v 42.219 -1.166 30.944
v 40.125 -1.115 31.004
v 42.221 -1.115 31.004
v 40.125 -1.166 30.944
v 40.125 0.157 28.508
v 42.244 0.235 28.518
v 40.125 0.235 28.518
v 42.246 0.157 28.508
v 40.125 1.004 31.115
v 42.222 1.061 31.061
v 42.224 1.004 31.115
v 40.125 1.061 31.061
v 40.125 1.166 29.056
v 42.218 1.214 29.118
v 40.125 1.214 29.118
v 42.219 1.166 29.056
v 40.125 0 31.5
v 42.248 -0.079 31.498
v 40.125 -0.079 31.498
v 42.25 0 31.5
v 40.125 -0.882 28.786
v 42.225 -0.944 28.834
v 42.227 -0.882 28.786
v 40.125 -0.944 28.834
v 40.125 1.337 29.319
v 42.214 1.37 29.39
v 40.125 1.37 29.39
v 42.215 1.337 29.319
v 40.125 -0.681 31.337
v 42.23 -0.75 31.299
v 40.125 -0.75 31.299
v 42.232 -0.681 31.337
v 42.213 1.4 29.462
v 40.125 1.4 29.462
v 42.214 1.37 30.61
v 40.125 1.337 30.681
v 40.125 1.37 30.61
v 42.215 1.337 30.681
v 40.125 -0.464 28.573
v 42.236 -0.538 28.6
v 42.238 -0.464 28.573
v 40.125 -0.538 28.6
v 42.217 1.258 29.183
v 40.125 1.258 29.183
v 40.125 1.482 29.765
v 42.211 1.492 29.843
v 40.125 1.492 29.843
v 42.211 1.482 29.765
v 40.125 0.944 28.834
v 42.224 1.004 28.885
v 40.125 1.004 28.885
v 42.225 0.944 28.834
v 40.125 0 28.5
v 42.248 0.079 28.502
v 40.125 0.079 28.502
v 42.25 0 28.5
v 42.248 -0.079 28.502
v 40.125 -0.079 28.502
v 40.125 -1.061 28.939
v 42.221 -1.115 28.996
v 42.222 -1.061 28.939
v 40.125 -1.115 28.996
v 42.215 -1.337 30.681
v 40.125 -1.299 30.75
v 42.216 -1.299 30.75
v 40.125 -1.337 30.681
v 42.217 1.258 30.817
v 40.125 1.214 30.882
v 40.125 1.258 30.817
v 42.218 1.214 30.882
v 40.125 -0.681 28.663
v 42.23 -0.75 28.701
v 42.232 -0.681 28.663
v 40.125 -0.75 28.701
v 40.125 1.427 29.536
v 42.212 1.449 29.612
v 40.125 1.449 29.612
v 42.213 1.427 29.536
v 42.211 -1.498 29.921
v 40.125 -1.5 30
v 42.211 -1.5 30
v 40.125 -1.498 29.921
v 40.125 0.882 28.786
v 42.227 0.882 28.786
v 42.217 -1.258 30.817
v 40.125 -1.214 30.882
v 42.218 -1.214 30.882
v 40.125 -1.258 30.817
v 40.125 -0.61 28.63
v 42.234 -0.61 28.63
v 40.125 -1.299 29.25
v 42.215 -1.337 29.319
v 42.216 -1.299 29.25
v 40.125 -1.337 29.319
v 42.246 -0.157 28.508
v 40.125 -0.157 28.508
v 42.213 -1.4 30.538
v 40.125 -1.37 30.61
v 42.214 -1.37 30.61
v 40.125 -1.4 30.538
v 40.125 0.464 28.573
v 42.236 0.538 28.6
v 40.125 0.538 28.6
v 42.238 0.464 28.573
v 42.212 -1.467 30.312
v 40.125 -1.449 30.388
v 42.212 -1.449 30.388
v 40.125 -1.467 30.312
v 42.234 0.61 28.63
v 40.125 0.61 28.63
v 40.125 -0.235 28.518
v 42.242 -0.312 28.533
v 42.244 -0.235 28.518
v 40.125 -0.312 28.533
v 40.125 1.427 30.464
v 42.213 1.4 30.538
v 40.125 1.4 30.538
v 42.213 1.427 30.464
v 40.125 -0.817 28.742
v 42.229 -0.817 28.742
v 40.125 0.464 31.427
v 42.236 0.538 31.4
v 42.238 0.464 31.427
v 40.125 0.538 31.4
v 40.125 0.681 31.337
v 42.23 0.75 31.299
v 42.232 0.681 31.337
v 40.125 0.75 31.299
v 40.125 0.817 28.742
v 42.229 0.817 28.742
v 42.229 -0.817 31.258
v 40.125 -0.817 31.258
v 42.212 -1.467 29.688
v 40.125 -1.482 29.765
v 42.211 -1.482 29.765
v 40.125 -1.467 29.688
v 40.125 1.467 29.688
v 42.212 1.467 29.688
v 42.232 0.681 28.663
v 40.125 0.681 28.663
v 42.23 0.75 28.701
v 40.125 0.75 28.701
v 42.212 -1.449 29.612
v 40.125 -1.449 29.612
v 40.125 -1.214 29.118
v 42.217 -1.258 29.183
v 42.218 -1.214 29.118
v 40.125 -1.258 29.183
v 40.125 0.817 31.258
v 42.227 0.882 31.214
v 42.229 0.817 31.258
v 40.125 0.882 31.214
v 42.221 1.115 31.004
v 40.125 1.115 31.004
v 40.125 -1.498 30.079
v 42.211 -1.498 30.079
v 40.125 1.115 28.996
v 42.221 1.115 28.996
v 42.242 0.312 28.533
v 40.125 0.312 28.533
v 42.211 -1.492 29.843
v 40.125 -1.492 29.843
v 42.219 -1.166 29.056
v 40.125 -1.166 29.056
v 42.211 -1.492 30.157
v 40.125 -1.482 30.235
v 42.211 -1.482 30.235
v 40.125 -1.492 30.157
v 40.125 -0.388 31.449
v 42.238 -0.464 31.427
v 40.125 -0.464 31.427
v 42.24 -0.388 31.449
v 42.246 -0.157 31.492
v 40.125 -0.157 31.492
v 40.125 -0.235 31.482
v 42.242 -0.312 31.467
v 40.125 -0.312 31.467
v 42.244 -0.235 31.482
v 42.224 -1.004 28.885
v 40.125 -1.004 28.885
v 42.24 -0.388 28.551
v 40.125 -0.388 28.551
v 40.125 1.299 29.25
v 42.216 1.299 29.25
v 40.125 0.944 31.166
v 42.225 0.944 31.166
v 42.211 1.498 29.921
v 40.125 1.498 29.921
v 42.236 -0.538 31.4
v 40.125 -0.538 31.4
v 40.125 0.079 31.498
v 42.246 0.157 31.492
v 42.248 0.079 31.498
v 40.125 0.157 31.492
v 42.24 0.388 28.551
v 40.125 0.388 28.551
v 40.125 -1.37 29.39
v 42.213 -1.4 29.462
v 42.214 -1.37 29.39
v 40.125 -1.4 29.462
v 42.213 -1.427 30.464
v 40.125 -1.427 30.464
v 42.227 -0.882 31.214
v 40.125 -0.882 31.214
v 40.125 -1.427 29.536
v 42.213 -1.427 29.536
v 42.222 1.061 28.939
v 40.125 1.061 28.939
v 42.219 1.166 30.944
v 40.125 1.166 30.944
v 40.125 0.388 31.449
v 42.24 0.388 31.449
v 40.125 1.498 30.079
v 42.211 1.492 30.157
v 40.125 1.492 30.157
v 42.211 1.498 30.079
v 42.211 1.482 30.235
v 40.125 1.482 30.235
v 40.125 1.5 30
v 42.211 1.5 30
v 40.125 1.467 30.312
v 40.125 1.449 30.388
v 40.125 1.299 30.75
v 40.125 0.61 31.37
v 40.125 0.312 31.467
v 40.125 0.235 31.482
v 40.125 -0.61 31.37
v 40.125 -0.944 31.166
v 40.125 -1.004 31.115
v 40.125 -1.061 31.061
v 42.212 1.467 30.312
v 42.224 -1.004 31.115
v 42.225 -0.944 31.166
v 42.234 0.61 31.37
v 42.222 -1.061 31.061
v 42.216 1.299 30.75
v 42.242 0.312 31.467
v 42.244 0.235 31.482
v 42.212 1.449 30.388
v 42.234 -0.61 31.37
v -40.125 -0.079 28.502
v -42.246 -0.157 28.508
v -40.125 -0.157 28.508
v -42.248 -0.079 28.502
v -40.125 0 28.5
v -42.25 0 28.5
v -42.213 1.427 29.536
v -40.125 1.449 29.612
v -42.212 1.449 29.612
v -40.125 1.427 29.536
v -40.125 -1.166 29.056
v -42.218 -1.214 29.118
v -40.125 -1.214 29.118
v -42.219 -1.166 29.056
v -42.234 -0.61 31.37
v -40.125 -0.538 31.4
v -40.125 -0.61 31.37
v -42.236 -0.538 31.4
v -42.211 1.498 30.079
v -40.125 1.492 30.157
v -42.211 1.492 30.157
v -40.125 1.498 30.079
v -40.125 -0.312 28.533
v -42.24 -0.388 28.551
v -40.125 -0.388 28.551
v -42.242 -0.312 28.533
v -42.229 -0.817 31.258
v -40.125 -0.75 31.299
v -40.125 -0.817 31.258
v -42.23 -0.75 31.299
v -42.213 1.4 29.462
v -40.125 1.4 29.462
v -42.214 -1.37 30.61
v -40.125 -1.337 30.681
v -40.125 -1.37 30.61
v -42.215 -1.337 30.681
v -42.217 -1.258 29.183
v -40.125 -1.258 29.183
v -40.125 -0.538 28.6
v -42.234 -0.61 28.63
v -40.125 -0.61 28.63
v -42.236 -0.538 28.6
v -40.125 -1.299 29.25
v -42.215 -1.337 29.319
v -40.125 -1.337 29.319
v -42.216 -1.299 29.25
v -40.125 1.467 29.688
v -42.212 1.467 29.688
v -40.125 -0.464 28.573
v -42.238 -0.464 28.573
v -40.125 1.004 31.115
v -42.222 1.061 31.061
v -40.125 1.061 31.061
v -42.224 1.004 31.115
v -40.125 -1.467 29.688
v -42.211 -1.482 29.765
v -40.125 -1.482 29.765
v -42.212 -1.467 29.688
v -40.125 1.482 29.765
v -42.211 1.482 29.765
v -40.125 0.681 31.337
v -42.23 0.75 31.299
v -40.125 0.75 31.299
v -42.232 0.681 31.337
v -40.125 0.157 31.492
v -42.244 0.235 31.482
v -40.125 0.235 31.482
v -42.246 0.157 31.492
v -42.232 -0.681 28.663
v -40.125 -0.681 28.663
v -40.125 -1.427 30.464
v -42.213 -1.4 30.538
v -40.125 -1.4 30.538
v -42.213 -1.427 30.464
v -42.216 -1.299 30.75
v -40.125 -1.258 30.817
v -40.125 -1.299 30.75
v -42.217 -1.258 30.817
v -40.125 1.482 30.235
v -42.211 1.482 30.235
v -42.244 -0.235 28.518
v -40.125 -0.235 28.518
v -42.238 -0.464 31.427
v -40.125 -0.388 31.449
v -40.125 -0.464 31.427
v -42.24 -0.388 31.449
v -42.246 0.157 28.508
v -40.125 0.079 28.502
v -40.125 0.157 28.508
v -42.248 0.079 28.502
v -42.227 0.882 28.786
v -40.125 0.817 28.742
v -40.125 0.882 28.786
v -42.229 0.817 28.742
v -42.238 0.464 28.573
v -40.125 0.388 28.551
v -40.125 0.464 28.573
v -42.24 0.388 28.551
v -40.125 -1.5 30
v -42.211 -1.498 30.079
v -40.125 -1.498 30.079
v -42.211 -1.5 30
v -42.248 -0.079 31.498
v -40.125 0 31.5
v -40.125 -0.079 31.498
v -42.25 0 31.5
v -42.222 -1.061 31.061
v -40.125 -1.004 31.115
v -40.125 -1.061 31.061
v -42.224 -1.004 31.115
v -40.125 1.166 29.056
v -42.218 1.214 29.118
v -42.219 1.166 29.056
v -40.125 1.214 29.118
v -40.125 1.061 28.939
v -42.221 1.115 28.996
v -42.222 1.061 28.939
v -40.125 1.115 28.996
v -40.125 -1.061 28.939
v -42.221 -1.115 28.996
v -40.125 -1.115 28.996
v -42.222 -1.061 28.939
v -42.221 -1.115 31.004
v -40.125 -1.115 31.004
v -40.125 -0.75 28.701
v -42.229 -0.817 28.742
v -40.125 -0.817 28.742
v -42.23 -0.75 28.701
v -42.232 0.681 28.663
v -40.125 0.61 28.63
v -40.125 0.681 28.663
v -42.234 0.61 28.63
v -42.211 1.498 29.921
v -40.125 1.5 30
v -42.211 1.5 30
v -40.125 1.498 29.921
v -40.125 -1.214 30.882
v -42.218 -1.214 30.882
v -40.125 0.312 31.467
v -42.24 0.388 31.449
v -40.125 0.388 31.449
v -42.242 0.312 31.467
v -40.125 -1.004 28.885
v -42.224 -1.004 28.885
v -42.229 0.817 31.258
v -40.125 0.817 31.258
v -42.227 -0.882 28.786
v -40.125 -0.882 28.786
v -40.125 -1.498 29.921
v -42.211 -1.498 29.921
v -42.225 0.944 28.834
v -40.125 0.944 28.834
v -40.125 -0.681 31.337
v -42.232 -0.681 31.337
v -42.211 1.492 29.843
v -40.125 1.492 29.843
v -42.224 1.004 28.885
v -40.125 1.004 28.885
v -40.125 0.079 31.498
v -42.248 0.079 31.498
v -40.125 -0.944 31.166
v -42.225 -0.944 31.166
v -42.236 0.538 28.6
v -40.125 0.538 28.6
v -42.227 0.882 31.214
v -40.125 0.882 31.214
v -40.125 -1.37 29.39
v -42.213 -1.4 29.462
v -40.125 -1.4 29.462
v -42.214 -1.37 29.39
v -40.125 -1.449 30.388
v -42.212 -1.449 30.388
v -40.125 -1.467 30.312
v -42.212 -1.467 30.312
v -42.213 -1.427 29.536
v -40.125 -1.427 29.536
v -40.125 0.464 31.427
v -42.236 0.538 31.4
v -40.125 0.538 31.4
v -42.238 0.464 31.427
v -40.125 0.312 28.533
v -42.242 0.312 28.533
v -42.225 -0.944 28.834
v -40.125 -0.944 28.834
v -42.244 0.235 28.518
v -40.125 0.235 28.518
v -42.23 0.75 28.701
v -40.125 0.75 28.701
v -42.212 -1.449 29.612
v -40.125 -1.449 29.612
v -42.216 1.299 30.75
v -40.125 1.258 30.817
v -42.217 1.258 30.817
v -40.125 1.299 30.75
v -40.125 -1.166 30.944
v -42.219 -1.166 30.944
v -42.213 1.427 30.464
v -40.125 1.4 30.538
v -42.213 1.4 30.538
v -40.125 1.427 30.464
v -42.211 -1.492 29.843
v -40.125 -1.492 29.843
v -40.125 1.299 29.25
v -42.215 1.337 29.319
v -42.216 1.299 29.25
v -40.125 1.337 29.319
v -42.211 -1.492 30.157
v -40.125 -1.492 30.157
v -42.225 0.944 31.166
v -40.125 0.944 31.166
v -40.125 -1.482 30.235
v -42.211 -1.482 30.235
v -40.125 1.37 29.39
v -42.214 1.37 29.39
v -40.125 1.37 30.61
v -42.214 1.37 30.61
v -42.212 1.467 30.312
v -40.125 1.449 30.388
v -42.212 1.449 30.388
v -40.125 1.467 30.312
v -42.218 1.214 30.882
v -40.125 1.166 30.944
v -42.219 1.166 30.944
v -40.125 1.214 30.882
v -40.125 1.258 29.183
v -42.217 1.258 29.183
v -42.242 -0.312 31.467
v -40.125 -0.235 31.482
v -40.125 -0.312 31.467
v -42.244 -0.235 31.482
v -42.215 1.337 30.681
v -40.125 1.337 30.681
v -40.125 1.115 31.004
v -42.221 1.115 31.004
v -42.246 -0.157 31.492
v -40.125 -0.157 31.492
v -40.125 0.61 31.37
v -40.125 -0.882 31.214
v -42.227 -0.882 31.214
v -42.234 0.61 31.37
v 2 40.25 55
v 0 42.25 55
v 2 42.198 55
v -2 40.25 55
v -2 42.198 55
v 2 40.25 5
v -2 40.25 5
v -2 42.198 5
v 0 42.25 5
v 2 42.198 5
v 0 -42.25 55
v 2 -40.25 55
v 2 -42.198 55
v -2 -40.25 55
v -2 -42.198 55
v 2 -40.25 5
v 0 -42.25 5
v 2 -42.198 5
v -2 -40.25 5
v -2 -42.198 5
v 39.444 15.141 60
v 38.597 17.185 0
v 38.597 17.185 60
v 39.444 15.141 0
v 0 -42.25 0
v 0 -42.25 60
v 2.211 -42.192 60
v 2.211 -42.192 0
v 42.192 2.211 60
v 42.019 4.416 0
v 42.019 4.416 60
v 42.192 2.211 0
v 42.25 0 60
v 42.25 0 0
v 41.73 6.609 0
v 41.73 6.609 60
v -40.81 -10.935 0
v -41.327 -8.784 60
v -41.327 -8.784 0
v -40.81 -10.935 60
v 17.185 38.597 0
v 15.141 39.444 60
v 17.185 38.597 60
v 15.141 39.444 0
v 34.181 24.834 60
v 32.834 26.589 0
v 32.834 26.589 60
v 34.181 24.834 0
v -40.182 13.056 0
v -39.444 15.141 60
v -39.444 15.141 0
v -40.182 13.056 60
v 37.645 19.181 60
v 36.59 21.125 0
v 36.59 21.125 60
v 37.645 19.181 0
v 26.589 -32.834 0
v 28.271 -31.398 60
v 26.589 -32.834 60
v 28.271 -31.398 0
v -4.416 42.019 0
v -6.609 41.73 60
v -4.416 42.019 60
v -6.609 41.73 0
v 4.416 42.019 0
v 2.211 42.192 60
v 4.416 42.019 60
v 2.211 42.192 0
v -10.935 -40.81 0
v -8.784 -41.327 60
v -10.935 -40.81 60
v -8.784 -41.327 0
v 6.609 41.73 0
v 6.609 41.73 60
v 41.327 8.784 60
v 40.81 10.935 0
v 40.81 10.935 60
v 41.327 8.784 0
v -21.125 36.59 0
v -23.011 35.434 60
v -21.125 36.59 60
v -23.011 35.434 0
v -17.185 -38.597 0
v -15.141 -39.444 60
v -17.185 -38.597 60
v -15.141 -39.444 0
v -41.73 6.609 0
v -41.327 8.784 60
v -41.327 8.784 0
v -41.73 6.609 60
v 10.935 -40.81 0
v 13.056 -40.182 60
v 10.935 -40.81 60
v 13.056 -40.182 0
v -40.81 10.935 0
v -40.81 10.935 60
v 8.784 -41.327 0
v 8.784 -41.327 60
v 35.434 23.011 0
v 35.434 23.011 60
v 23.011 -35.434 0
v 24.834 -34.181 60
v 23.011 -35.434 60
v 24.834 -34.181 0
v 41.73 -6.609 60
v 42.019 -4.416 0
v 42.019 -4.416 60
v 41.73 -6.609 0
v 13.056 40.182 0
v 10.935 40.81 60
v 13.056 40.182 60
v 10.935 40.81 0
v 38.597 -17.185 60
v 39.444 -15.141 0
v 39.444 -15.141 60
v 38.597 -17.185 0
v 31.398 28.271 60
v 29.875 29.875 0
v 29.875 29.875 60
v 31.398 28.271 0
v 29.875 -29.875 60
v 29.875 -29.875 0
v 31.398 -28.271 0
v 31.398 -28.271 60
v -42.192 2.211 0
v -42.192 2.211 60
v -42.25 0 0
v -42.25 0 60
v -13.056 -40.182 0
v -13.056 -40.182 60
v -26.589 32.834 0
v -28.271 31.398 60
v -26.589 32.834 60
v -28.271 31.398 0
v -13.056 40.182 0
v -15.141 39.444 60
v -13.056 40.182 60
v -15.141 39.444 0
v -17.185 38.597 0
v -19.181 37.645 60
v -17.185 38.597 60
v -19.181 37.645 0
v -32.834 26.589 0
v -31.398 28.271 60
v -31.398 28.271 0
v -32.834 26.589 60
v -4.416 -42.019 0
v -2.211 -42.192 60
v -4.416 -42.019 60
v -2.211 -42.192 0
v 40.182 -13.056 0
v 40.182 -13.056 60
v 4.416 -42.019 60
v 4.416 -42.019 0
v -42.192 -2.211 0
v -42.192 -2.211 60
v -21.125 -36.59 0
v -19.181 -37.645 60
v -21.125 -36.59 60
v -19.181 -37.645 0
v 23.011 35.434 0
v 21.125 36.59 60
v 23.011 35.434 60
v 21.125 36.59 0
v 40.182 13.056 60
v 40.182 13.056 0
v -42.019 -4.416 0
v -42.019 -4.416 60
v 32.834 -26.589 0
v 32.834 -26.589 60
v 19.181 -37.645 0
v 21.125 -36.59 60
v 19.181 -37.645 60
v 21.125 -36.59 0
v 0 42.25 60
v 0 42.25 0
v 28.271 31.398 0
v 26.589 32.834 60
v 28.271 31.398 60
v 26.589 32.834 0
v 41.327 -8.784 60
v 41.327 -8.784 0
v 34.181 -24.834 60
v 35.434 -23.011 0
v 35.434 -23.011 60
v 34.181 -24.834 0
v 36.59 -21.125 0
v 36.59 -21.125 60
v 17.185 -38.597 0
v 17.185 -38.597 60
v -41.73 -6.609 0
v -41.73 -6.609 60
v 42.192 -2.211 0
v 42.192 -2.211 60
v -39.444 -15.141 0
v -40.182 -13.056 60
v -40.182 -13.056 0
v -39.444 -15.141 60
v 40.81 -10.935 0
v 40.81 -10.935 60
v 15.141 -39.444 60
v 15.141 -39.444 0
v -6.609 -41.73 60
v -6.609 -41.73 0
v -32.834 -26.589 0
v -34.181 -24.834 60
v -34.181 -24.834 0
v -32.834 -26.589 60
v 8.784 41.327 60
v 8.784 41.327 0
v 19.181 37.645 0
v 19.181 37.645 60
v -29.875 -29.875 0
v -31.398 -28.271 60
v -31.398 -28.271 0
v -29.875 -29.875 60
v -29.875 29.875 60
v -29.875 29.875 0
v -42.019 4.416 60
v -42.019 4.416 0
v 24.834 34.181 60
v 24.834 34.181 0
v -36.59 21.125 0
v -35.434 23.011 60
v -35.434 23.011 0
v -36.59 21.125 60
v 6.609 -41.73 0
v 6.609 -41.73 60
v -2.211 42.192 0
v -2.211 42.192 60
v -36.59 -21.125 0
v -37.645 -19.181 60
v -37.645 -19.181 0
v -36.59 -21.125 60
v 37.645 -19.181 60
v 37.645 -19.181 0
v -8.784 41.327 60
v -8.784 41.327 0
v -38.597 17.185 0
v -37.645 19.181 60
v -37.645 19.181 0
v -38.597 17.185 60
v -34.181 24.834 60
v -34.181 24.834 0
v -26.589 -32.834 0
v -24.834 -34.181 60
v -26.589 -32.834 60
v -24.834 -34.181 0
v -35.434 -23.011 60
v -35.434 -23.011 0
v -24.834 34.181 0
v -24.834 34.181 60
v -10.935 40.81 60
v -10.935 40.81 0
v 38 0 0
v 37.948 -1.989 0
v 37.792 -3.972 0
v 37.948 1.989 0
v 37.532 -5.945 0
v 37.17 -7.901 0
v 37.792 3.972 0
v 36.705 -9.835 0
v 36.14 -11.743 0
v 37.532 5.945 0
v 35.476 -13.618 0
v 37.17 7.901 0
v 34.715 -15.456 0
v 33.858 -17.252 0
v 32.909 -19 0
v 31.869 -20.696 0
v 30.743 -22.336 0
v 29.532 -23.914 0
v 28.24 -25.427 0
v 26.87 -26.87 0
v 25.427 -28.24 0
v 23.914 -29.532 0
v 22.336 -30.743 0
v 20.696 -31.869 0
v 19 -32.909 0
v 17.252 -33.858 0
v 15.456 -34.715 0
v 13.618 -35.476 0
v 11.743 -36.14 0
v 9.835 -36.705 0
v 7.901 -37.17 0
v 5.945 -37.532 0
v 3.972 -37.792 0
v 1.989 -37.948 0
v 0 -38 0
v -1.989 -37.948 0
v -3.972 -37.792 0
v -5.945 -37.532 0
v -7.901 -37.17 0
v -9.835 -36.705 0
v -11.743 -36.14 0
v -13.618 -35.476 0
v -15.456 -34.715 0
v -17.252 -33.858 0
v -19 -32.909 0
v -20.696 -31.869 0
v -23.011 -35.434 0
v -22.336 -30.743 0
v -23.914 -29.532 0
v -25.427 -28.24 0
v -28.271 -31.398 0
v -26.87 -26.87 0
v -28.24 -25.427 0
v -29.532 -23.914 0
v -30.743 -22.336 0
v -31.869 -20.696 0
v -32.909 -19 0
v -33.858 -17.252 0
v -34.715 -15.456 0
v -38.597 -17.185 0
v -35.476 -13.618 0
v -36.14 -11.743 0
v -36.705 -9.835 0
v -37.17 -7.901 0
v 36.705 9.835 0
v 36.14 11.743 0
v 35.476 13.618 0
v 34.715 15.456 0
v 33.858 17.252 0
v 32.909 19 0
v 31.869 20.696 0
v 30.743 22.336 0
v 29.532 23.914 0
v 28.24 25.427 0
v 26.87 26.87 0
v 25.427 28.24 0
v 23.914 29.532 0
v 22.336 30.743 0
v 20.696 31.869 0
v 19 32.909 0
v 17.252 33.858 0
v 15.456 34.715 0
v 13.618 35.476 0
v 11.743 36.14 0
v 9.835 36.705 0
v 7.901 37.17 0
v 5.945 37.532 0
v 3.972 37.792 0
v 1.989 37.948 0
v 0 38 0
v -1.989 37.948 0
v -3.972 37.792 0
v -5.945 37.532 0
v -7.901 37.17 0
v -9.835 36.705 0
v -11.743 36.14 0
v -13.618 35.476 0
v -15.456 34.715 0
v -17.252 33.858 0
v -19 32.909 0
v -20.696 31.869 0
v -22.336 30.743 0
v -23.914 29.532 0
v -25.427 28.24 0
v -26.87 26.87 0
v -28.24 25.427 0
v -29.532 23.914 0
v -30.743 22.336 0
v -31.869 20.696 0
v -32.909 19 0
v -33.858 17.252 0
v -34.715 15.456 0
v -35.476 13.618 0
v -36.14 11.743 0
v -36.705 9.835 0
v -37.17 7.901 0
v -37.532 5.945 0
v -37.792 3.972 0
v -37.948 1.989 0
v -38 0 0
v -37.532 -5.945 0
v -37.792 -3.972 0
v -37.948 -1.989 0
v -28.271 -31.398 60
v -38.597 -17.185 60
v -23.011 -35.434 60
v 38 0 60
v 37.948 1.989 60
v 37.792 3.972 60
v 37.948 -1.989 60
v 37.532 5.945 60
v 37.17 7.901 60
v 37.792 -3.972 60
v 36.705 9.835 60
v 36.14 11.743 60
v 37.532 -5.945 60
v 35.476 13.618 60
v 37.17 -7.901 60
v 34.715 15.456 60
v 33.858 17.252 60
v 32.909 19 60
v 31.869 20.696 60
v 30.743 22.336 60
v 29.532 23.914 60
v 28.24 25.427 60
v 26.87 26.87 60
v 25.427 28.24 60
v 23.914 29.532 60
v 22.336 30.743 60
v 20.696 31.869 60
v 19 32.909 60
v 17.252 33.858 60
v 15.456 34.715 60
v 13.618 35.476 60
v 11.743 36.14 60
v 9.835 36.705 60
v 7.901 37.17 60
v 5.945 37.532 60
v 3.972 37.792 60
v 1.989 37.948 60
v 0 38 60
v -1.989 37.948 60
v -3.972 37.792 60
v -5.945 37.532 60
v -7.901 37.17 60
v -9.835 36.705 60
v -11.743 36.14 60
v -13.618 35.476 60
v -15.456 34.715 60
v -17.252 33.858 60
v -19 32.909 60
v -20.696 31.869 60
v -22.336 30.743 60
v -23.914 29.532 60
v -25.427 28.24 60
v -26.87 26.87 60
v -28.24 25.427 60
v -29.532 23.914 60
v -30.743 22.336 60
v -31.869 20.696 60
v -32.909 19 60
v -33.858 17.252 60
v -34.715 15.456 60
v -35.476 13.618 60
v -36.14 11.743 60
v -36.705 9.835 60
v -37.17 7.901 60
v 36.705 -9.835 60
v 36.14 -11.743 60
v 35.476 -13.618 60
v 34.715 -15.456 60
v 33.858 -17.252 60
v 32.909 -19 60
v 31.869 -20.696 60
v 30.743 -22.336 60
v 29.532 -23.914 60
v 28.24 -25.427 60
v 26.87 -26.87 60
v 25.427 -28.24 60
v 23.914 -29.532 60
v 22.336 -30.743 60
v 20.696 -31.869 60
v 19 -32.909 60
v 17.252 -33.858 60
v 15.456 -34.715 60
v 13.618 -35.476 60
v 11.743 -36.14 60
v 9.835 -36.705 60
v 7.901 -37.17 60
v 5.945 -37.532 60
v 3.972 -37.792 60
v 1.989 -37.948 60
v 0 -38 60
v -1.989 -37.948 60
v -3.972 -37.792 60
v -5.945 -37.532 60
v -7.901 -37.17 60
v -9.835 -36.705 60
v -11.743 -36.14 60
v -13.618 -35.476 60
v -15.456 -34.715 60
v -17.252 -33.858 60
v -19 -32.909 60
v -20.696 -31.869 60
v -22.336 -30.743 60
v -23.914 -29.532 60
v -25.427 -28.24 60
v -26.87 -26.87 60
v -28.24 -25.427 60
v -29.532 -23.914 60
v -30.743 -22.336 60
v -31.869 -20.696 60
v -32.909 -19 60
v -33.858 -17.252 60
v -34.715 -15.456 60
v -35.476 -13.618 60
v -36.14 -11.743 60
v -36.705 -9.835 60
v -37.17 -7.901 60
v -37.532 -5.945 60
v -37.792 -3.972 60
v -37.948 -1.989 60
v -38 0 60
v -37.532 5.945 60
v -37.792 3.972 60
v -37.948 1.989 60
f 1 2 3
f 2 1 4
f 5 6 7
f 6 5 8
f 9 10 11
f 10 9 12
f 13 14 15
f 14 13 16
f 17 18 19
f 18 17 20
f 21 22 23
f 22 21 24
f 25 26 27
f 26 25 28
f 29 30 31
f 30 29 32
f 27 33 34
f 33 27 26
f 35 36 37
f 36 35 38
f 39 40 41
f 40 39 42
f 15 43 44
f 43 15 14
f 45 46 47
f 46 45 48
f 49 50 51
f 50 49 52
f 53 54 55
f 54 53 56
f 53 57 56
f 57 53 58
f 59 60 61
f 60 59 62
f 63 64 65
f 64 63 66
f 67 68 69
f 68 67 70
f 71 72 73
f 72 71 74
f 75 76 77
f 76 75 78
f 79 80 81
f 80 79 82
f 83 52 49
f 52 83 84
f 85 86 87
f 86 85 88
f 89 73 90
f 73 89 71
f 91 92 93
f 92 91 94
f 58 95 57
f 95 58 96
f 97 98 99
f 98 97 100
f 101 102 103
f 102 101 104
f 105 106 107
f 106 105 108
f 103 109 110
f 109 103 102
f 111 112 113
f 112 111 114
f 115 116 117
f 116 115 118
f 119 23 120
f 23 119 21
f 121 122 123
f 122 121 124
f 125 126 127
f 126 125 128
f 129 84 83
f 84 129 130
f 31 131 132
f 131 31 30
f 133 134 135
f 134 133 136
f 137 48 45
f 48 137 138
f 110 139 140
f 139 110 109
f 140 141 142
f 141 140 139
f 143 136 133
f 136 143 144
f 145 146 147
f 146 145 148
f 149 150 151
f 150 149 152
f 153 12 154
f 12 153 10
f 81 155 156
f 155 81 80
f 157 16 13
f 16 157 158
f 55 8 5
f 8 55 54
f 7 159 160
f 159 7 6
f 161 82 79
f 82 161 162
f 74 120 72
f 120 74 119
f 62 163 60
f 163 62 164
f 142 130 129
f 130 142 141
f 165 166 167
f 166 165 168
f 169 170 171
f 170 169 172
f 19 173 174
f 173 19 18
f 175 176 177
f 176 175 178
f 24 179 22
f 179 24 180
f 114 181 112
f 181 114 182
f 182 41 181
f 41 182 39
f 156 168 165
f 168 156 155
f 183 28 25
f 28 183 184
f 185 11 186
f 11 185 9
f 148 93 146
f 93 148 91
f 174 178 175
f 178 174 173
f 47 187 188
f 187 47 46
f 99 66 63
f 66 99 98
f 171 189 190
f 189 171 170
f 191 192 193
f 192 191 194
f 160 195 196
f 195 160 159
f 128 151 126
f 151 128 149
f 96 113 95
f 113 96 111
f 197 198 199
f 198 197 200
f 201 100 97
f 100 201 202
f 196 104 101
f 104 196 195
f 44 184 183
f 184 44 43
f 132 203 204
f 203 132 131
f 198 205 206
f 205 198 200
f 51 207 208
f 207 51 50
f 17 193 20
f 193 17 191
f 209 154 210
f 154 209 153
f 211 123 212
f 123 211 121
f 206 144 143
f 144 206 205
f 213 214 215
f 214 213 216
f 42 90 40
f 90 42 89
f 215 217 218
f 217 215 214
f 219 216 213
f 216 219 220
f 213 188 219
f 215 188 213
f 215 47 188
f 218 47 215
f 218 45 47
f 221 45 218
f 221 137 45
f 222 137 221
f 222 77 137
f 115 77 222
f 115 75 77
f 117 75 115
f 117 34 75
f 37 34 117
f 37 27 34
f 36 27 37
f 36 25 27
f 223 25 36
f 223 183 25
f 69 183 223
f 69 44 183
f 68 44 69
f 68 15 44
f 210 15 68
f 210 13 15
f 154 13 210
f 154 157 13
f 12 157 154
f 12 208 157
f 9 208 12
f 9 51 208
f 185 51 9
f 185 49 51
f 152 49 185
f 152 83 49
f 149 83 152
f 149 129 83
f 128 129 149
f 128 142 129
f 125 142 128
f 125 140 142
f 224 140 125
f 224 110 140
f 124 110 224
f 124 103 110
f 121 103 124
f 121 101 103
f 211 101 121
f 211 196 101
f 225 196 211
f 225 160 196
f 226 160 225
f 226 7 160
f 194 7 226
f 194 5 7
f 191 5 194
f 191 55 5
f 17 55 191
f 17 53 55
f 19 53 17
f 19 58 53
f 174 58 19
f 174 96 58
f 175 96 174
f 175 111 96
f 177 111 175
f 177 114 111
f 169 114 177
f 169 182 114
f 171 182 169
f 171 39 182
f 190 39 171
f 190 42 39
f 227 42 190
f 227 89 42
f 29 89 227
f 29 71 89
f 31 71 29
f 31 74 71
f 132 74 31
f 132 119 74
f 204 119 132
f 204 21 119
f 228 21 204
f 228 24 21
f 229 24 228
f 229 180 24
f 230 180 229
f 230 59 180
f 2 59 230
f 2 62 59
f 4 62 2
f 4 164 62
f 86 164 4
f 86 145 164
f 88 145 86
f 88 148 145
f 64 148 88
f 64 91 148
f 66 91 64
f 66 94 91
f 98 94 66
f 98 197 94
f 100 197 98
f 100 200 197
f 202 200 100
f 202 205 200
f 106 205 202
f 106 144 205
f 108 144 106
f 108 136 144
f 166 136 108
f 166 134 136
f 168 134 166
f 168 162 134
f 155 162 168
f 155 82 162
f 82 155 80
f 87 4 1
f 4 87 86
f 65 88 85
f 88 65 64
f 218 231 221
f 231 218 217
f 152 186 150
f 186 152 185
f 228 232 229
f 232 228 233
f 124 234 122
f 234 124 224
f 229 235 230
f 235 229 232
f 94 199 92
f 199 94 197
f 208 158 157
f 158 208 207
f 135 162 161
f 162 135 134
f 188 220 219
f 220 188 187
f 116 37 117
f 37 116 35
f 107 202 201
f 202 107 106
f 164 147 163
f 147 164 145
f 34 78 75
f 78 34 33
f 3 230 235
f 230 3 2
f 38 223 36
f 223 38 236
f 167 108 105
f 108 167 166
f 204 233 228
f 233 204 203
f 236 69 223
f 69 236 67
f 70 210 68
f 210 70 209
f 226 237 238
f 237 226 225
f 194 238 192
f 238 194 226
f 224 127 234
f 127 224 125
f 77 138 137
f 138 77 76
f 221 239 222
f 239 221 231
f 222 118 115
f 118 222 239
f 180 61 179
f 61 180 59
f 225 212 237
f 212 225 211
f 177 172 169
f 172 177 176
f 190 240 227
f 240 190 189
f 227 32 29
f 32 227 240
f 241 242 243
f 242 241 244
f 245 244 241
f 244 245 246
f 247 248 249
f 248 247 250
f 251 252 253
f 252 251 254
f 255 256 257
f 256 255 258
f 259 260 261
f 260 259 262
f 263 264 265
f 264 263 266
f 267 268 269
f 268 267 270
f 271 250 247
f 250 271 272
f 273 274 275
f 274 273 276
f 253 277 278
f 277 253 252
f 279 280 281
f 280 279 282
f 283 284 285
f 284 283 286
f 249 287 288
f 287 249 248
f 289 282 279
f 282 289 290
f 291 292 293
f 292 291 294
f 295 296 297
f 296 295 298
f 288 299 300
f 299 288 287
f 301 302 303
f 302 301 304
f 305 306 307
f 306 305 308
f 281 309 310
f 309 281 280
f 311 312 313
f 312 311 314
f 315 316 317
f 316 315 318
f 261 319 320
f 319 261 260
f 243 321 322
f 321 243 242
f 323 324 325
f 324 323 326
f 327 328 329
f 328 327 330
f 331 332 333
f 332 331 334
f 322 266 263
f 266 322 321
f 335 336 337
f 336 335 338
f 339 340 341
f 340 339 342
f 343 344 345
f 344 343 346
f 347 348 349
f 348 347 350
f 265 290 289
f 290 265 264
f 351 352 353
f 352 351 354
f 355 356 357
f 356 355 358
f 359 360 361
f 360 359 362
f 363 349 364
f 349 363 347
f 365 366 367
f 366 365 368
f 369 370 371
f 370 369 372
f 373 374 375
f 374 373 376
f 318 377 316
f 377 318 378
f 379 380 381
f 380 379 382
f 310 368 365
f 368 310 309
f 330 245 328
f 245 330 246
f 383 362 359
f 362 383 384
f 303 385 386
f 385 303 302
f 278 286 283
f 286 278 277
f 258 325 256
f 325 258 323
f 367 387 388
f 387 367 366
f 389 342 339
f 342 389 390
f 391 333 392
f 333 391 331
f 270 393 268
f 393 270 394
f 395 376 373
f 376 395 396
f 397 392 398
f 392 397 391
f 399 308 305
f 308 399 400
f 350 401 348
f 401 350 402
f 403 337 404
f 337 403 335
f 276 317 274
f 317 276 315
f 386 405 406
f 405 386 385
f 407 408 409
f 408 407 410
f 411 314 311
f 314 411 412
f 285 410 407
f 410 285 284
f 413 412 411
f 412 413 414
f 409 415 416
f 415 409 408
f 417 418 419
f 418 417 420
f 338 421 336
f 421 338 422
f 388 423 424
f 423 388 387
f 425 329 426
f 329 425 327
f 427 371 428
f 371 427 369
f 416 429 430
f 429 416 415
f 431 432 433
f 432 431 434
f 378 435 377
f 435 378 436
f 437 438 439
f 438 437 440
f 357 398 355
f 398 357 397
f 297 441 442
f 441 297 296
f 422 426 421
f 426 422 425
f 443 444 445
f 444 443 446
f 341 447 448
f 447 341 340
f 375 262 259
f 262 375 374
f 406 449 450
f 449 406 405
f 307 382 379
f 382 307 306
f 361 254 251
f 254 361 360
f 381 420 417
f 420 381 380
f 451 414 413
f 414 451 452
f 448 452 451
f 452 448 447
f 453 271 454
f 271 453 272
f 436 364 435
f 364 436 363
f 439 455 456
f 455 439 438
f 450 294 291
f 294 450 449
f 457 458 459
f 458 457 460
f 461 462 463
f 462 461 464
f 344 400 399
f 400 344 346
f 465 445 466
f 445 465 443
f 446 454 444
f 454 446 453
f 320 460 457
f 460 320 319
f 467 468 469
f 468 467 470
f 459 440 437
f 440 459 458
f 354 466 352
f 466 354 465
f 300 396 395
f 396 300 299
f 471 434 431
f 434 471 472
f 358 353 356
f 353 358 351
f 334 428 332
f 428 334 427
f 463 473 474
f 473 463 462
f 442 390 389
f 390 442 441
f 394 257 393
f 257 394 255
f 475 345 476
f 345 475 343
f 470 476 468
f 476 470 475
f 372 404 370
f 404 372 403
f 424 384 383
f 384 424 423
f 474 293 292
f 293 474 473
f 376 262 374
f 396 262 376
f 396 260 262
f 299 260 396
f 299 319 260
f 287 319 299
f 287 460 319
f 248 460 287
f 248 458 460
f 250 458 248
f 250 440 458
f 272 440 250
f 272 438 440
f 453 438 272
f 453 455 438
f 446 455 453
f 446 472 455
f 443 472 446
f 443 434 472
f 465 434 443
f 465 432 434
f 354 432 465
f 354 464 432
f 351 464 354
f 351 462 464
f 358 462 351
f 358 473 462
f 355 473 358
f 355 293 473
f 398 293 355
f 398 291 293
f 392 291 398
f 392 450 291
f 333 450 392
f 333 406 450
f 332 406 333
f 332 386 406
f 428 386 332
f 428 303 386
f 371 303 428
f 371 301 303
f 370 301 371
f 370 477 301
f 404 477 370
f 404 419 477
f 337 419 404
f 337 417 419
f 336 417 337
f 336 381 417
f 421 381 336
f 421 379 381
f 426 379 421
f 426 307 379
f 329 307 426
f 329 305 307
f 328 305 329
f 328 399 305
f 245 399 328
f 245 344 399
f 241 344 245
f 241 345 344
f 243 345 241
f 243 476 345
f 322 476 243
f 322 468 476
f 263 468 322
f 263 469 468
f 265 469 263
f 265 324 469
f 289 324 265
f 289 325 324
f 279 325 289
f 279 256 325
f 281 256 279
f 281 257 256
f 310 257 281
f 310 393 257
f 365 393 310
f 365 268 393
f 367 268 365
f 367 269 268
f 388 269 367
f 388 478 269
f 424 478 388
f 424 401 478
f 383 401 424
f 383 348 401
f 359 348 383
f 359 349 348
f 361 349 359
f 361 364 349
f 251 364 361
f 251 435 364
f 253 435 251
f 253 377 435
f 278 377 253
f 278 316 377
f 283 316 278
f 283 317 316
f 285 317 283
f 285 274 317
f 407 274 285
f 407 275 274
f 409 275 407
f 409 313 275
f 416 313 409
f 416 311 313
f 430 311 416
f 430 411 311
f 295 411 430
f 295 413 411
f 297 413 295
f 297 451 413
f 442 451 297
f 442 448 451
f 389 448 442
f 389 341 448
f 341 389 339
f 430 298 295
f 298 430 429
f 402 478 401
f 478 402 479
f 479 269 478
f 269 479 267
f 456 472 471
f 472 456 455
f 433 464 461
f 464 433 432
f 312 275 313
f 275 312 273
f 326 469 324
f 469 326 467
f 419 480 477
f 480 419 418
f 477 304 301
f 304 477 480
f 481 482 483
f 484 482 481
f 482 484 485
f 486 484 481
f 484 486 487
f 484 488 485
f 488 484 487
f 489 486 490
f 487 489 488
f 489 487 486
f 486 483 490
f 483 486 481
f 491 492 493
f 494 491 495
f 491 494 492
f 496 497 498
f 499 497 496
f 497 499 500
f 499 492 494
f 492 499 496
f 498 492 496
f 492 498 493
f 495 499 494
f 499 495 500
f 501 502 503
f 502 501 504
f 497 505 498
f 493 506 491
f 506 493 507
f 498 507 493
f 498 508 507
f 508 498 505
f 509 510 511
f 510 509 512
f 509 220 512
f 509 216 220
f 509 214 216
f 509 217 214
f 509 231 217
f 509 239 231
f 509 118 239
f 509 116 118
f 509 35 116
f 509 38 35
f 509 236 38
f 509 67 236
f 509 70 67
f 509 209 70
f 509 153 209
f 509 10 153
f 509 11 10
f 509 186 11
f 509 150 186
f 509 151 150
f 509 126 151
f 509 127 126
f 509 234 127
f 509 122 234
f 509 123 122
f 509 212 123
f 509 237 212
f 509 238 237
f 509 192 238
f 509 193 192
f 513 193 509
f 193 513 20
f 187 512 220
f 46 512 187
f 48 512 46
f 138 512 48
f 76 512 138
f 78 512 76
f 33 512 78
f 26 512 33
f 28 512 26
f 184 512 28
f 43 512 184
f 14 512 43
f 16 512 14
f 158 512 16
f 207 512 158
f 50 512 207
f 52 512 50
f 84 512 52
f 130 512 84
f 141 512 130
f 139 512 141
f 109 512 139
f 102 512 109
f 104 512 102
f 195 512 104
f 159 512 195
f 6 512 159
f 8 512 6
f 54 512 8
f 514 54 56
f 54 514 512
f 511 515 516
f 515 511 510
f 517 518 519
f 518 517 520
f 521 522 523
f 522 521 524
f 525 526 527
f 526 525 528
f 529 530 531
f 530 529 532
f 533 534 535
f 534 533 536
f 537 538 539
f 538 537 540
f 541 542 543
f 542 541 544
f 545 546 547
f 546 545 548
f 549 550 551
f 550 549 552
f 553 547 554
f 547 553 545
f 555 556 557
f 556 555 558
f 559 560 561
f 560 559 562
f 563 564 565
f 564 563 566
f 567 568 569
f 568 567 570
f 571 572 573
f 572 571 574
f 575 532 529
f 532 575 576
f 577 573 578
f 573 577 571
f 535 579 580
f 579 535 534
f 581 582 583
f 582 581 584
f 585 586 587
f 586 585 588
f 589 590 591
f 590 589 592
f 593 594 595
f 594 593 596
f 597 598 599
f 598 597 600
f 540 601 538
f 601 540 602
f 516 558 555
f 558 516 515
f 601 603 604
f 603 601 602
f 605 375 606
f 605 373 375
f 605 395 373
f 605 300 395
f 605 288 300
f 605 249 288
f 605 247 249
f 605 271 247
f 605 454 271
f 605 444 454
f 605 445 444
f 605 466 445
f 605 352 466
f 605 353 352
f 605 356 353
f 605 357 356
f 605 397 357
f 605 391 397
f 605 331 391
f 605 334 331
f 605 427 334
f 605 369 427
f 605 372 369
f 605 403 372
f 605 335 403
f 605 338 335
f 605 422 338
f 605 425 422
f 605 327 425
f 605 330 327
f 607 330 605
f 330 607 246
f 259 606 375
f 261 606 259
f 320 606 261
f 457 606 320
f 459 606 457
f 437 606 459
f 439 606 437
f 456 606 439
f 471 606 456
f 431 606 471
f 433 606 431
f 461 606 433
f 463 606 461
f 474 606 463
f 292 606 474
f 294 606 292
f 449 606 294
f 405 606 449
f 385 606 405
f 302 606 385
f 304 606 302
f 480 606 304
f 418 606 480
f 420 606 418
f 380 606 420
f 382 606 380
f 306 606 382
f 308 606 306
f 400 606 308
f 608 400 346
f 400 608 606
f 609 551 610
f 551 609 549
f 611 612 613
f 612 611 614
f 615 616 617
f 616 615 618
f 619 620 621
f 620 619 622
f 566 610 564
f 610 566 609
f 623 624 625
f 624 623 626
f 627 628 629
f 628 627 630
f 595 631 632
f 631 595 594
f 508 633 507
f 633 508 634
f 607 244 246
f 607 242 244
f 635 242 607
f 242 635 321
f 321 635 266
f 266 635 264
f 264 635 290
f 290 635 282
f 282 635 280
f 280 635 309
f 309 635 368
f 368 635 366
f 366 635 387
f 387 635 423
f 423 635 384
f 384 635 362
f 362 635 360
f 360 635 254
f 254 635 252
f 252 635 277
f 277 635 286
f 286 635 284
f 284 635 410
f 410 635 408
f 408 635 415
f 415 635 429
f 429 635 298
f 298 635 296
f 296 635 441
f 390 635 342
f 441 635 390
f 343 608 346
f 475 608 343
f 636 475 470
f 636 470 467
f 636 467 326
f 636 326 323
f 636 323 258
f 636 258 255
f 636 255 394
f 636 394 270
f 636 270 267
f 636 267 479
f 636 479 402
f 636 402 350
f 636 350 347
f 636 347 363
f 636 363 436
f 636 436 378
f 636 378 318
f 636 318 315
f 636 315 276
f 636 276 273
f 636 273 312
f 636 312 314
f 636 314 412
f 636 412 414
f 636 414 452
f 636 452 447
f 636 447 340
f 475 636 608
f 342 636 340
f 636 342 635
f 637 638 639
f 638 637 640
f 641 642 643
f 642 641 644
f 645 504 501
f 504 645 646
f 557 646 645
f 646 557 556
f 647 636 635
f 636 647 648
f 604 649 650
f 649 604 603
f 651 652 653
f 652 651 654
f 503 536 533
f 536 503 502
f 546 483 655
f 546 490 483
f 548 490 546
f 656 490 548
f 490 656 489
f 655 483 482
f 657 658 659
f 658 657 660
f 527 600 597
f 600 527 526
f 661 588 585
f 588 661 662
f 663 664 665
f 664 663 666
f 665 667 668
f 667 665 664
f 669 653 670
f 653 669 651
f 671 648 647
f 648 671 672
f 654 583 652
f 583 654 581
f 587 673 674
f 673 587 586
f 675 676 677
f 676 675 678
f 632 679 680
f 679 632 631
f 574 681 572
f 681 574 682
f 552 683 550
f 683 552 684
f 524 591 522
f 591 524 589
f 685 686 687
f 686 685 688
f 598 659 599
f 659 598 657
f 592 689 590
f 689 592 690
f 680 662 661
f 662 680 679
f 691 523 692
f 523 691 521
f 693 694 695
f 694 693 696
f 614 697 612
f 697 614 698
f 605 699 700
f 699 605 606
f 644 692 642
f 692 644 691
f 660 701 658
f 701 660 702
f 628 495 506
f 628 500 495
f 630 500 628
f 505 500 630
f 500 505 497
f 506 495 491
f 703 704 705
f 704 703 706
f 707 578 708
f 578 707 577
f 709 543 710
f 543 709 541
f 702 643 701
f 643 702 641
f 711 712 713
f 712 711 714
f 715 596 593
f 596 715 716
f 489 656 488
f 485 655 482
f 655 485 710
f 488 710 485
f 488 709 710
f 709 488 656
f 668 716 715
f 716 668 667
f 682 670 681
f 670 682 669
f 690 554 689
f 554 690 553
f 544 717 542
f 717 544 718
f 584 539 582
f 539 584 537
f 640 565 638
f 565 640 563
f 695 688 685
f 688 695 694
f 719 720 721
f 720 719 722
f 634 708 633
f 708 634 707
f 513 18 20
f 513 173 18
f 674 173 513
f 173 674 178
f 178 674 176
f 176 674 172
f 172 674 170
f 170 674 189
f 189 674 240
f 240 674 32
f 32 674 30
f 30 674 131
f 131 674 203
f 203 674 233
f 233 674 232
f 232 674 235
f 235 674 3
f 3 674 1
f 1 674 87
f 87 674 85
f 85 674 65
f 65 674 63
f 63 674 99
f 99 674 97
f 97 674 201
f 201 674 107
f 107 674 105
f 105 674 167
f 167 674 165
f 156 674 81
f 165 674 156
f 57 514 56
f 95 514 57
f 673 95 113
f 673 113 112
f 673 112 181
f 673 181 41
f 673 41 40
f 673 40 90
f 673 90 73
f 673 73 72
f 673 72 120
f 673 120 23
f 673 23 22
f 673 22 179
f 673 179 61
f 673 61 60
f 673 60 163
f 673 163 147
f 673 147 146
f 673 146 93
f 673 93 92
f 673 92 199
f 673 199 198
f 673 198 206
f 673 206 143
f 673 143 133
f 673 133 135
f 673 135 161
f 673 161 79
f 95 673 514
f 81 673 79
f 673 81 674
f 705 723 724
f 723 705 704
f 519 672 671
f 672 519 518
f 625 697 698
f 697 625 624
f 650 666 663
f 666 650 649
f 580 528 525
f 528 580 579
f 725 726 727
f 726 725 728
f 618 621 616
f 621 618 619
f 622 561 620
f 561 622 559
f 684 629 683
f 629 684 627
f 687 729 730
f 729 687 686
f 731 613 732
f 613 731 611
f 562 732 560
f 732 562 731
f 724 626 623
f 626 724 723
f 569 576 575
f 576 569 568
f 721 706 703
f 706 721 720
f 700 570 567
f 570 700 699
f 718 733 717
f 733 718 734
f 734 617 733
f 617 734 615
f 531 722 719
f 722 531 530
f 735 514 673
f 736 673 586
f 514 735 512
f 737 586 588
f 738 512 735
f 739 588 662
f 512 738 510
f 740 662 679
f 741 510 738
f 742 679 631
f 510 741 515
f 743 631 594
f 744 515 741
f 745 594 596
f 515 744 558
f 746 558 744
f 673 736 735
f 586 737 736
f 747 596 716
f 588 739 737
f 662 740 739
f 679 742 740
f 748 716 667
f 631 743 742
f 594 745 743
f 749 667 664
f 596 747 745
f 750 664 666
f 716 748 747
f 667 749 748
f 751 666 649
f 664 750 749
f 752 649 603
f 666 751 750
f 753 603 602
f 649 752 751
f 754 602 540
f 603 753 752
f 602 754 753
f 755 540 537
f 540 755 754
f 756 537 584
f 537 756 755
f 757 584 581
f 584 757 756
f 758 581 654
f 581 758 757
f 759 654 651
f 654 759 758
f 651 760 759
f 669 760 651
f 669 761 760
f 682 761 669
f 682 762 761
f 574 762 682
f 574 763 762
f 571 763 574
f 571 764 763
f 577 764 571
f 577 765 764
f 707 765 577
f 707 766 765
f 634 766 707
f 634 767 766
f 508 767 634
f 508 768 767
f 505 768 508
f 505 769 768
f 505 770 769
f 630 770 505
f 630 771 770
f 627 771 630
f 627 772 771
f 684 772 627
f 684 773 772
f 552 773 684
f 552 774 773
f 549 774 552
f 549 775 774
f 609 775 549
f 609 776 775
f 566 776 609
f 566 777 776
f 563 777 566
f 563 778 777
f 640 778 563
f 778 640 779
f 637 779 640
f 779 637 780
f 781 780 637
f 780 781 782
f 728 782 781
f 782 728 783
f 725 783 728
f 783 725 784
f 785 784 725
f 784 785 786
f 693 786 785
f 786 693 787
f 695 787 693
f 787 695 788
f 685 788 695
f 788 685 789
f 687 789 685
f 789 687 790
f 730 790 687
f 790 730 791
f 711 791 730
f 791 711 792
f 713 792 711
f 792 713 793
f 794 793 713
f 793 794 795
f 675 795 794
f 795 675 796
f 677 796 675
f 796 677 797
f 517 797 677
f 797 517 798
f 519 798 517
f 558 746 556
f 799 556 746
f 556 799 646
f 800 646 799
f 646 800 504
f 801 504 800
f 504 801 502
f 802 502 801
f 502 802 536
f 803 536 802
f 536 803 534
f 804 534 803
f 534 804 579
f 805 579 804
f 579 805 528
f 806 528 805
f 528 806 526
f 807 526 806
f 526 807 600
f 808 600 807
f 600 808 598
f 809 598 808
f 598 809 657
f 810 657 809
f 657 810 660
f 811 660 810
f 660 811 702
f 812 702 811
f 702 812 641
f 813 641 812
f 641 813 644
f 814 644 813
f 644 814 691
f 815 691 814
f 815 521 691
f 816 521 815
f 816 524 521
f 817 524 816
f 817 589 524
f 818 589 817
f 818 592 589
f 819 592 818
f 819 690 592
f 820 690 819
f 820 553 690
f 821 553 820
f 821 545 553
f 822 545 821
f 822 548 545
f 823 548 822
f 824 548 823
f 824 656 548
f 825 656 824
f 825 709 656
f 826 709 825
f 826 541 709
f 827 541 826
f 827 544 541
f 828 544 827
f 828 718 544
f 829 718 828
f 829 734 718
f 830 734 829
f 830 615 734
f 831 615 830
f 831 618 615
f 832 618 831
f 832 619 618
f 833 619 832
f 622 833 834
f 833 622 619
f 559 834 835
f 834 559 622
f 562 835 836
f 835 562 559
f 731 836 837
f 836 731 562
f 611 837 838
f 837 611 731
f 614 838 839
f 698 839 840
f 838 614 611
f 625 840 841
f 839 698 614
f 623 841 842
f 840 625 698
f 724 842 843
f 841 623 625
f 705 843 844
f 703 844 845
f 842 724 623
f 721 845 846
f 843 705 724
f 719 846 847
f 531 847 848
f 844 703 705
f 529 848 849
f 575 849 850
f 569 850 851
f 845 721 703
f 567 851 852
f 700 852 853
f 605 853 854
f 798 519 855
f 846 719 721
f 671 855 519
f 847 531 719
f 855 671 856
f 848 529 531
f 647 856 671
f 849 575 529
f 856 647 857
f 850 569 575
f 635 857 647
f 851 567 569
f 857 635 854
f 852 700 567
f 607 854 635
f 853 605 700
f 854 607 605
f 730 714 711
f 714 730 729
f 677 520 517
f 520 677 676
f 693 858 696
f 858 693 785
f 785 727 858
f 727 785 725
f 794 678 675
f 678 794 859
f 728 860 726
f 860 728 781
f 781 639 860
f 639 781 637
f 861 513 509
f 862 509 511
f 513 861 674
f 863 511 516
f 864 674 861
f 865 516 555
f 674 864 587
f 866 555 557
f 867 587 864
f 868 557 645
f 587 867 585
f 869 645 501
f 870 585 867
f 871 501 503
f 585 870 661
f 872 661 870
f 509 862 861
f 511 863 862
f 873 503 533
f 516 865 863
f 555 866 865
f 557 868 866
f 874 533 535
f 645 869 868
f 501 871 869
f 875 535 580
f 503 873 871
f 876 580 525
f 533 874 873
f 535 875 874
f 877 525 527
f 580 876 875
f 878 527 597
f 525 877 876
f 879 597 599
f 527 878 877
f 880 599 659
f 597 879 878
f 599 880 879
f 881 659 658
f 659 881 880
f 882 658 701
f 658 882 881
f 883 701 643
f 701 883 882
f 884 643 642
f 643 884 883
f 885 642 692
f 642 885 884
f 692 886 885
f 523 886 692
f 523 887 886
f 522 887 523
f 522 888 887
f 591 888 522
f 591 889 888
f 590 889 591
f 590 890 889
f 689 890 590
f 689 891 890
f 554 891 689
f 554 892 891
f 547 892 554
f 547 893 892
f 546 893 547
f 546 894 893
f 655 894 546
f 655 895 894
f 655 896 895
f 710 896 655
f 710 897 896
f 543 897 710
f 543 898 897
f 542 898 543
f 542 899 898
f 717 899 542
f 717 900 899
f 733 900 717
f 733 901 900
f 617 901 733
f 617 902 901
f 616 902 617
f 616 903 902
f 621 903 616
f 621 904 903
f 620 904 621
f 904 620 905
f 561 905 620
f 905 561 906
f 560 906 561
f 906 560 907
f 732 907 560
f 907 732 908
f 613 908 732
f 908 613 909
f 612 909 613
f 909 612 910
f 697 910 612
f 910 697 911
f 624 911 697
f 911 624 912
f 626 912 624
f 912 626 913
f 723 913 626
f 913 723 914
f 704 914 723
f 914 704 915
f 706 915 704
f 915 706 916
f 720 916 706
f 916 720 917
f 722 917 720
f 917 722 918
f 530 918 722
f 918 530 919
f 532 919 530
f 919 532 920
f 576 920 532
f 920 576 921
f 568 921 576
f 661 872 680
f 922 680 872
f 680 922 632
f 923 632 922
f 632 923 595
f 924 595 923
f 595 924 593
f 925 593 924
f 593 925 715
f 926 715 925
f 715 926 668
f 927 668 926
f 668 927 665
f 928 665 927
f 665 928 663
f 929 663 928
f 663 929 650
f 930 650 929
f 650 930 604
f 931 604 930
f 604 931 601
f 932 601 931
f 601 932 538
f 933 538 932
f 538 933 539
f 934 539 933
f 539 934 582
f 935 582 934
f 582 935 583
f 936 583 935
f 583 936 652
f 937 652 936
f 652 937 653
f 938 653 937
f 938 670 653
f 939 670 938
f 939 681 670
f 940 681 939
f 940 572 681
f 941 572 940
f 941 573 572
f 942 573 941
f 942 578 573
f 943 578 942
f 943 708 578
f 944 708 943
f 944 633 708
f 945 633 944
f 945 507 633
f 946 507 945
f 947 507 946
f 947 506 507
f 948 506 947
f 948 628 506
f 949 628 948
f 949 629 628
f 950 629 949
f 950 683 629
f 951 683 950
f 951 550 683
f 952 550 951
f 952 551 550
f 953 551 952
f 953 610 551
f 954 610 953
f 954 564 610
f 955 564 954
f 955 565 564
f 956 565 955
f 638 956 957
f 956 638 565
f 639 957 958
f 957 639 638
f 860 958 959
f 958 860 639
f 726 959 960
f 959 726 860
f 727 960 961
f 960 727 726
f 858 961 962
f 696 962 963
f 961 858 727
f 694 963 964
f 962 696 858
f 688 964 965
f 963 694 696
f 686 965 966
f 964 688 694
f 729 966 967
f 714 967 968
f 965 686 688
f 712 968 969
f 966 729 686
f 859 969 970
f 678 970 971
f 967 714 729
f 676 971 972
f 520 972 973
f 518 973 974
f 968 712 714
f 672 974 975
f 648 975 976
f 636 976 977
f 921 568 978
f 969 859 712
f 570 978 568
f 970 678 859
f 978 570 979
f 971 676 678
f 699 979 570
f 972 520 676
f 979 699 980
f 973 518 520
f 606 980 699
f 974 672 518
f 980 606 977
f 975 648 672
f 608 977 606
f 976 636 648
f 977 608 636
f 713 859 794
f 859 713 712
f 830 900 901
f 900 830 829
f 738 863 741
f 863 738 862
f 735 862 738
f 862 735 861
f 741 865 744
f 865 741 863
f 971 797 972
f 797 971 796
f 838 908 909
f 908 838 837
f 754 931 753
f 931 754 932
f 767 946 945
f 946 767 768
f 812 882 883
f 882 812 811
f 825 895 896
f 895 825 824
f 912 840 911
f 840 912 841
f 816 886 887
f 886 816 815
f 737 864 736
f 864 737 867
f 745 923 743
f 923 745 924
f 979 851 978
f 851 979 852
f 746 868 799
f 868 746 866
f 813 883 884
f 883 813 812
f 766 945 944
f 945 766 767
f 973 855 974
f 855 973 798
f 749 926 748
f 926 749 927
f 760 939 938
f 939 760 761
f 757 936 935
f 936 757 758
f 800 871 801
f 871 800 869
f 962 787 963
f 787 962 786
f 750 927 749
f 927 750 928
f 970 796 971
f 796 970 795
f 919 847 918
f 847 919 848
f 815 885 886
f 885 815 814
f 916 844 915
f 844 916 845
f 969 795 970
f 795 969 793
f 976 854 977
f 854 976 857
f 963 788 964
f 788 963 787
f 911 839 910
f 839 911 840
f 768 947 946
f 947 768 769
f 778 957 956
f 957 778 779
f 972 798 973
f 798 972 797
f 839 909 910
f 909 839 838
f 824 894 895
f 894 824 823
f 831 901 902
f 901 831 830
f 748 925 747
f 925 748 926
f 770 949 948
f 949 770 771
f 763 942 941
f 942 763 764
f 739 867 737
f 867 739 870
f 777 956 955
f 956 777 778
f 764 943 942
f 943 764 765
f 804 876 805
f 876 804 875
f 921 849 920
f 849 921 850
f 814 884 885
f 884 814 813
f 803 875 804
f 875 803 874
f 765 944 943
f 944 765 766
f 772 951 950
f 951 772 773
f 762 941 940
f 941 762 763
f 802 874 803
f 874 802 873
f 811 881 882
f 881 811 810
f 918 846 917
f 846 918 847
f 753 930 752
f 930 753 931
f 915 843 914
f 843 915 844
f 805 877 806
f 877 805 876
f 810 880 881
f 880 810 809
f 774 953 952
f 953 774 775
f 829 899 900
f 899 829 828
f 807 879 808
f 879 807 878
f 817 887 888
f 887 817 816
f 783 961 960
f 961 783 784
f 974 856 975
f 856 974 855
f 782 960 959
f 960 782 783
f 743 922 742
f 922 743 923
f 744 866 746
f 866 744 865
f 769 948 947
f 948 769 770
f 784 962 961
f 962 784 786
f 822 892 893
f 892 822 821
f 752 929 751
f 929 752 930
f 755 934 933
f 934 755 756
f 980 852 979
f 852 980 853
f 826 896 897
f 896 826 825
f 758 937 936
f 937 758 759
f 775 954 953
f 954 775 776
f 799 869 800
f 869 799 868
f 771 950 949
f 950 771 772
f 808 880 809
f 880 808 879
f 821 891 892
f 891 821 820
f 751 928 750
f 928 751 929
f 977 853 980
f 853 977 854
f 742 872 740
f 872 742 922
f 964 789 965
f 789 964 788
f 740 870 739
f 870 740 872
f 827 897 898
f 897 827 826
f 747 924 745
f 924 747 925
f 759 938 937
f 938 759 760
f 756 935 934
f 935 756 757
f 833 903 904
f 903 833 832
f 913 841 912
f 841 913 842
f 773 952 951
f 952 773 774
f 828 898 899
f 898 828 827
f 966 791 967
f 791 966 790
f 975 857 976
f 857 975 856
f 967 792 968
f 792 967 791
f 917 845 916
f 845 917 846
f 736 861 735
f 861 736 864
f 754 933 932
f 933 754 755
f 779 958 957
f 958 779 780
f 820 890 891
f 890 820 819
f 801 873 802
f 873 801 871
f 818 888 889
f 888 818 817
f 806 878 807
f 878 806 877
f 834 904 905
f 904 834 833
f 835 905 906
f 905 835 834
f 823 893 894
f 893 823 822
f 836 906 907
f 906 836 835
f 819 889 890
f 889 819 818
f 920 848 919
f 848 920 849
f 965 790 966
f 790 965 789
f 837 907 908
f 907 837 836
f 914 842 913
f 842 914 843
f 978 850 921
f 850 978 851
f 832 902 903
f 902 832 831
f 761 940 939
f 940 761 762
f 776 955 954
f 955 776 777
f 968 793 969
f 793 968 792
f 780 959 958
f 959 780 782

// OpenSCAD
// ============================================================
// 400mm DIY 镜头 - 零件 3：调焦内管
// 功能：在镜筒内前后滑动，微调物镜到传感器的距离以实现精确合焦
// 材料：PLA 黑色
// ============================================================

// 外径需小于 PVC 管内径（Φ90mm 管内径约 85mm）
slide_outer = 84.5;     // 外径（在管内滑动，留 0.5mm 间隙）
slide_inner = 76.0;     // 内径（通光）
slide_length = 60.0;    // 长度（调焦行程约 30mm）
wall_thickness = 4.25;  // 壁厚

// 锁紧螺丝参数
lock_screw_d = 3.0;     // 锁紧螺丝直径
lock_screw_count = 2;   // 锁紧螺丝数量

// 防转销（防止内管旋转，只允许前后移动）
anti_rotation_count = 2;
anti_rotation_width = 4.0;
anti_rotation_depth = 3.0;

$fn = 120;

module focusing_tube() {
    difference() {
        // 外圆柱
        cylinder(d=slide_outer, h=slide_length);

        // 内孔（通光）
        cylinder(d=slide_inner, h=slide_length + 0.1);

        // 锁紧螺丝孔（中部位置）
        for(i = [0:lock_screw_count - 1]) {
            rotate([0, 0, i * 180])
                translate([slide_outer / 2 + 0.5, 0, slide_length / 2])
                    rotate([0, 90, 0])
                        cylinder(d=lock_screw_d, h=wall_thickness + 1, center=true);
        }

        // 防转销槽（沿轴向的凹槽）
        for(i = [0:anti_rotation_count - 1]) {
            rotate([0, 0, i * 180 + 90])
                translate([slide_outer / 2, 0, slide_length / 2])
                    cube([anti_rotation_depth + 1, anti_rotation_width, slide_length - 10], center=true);
        }
    }
}

focusing_tube();
